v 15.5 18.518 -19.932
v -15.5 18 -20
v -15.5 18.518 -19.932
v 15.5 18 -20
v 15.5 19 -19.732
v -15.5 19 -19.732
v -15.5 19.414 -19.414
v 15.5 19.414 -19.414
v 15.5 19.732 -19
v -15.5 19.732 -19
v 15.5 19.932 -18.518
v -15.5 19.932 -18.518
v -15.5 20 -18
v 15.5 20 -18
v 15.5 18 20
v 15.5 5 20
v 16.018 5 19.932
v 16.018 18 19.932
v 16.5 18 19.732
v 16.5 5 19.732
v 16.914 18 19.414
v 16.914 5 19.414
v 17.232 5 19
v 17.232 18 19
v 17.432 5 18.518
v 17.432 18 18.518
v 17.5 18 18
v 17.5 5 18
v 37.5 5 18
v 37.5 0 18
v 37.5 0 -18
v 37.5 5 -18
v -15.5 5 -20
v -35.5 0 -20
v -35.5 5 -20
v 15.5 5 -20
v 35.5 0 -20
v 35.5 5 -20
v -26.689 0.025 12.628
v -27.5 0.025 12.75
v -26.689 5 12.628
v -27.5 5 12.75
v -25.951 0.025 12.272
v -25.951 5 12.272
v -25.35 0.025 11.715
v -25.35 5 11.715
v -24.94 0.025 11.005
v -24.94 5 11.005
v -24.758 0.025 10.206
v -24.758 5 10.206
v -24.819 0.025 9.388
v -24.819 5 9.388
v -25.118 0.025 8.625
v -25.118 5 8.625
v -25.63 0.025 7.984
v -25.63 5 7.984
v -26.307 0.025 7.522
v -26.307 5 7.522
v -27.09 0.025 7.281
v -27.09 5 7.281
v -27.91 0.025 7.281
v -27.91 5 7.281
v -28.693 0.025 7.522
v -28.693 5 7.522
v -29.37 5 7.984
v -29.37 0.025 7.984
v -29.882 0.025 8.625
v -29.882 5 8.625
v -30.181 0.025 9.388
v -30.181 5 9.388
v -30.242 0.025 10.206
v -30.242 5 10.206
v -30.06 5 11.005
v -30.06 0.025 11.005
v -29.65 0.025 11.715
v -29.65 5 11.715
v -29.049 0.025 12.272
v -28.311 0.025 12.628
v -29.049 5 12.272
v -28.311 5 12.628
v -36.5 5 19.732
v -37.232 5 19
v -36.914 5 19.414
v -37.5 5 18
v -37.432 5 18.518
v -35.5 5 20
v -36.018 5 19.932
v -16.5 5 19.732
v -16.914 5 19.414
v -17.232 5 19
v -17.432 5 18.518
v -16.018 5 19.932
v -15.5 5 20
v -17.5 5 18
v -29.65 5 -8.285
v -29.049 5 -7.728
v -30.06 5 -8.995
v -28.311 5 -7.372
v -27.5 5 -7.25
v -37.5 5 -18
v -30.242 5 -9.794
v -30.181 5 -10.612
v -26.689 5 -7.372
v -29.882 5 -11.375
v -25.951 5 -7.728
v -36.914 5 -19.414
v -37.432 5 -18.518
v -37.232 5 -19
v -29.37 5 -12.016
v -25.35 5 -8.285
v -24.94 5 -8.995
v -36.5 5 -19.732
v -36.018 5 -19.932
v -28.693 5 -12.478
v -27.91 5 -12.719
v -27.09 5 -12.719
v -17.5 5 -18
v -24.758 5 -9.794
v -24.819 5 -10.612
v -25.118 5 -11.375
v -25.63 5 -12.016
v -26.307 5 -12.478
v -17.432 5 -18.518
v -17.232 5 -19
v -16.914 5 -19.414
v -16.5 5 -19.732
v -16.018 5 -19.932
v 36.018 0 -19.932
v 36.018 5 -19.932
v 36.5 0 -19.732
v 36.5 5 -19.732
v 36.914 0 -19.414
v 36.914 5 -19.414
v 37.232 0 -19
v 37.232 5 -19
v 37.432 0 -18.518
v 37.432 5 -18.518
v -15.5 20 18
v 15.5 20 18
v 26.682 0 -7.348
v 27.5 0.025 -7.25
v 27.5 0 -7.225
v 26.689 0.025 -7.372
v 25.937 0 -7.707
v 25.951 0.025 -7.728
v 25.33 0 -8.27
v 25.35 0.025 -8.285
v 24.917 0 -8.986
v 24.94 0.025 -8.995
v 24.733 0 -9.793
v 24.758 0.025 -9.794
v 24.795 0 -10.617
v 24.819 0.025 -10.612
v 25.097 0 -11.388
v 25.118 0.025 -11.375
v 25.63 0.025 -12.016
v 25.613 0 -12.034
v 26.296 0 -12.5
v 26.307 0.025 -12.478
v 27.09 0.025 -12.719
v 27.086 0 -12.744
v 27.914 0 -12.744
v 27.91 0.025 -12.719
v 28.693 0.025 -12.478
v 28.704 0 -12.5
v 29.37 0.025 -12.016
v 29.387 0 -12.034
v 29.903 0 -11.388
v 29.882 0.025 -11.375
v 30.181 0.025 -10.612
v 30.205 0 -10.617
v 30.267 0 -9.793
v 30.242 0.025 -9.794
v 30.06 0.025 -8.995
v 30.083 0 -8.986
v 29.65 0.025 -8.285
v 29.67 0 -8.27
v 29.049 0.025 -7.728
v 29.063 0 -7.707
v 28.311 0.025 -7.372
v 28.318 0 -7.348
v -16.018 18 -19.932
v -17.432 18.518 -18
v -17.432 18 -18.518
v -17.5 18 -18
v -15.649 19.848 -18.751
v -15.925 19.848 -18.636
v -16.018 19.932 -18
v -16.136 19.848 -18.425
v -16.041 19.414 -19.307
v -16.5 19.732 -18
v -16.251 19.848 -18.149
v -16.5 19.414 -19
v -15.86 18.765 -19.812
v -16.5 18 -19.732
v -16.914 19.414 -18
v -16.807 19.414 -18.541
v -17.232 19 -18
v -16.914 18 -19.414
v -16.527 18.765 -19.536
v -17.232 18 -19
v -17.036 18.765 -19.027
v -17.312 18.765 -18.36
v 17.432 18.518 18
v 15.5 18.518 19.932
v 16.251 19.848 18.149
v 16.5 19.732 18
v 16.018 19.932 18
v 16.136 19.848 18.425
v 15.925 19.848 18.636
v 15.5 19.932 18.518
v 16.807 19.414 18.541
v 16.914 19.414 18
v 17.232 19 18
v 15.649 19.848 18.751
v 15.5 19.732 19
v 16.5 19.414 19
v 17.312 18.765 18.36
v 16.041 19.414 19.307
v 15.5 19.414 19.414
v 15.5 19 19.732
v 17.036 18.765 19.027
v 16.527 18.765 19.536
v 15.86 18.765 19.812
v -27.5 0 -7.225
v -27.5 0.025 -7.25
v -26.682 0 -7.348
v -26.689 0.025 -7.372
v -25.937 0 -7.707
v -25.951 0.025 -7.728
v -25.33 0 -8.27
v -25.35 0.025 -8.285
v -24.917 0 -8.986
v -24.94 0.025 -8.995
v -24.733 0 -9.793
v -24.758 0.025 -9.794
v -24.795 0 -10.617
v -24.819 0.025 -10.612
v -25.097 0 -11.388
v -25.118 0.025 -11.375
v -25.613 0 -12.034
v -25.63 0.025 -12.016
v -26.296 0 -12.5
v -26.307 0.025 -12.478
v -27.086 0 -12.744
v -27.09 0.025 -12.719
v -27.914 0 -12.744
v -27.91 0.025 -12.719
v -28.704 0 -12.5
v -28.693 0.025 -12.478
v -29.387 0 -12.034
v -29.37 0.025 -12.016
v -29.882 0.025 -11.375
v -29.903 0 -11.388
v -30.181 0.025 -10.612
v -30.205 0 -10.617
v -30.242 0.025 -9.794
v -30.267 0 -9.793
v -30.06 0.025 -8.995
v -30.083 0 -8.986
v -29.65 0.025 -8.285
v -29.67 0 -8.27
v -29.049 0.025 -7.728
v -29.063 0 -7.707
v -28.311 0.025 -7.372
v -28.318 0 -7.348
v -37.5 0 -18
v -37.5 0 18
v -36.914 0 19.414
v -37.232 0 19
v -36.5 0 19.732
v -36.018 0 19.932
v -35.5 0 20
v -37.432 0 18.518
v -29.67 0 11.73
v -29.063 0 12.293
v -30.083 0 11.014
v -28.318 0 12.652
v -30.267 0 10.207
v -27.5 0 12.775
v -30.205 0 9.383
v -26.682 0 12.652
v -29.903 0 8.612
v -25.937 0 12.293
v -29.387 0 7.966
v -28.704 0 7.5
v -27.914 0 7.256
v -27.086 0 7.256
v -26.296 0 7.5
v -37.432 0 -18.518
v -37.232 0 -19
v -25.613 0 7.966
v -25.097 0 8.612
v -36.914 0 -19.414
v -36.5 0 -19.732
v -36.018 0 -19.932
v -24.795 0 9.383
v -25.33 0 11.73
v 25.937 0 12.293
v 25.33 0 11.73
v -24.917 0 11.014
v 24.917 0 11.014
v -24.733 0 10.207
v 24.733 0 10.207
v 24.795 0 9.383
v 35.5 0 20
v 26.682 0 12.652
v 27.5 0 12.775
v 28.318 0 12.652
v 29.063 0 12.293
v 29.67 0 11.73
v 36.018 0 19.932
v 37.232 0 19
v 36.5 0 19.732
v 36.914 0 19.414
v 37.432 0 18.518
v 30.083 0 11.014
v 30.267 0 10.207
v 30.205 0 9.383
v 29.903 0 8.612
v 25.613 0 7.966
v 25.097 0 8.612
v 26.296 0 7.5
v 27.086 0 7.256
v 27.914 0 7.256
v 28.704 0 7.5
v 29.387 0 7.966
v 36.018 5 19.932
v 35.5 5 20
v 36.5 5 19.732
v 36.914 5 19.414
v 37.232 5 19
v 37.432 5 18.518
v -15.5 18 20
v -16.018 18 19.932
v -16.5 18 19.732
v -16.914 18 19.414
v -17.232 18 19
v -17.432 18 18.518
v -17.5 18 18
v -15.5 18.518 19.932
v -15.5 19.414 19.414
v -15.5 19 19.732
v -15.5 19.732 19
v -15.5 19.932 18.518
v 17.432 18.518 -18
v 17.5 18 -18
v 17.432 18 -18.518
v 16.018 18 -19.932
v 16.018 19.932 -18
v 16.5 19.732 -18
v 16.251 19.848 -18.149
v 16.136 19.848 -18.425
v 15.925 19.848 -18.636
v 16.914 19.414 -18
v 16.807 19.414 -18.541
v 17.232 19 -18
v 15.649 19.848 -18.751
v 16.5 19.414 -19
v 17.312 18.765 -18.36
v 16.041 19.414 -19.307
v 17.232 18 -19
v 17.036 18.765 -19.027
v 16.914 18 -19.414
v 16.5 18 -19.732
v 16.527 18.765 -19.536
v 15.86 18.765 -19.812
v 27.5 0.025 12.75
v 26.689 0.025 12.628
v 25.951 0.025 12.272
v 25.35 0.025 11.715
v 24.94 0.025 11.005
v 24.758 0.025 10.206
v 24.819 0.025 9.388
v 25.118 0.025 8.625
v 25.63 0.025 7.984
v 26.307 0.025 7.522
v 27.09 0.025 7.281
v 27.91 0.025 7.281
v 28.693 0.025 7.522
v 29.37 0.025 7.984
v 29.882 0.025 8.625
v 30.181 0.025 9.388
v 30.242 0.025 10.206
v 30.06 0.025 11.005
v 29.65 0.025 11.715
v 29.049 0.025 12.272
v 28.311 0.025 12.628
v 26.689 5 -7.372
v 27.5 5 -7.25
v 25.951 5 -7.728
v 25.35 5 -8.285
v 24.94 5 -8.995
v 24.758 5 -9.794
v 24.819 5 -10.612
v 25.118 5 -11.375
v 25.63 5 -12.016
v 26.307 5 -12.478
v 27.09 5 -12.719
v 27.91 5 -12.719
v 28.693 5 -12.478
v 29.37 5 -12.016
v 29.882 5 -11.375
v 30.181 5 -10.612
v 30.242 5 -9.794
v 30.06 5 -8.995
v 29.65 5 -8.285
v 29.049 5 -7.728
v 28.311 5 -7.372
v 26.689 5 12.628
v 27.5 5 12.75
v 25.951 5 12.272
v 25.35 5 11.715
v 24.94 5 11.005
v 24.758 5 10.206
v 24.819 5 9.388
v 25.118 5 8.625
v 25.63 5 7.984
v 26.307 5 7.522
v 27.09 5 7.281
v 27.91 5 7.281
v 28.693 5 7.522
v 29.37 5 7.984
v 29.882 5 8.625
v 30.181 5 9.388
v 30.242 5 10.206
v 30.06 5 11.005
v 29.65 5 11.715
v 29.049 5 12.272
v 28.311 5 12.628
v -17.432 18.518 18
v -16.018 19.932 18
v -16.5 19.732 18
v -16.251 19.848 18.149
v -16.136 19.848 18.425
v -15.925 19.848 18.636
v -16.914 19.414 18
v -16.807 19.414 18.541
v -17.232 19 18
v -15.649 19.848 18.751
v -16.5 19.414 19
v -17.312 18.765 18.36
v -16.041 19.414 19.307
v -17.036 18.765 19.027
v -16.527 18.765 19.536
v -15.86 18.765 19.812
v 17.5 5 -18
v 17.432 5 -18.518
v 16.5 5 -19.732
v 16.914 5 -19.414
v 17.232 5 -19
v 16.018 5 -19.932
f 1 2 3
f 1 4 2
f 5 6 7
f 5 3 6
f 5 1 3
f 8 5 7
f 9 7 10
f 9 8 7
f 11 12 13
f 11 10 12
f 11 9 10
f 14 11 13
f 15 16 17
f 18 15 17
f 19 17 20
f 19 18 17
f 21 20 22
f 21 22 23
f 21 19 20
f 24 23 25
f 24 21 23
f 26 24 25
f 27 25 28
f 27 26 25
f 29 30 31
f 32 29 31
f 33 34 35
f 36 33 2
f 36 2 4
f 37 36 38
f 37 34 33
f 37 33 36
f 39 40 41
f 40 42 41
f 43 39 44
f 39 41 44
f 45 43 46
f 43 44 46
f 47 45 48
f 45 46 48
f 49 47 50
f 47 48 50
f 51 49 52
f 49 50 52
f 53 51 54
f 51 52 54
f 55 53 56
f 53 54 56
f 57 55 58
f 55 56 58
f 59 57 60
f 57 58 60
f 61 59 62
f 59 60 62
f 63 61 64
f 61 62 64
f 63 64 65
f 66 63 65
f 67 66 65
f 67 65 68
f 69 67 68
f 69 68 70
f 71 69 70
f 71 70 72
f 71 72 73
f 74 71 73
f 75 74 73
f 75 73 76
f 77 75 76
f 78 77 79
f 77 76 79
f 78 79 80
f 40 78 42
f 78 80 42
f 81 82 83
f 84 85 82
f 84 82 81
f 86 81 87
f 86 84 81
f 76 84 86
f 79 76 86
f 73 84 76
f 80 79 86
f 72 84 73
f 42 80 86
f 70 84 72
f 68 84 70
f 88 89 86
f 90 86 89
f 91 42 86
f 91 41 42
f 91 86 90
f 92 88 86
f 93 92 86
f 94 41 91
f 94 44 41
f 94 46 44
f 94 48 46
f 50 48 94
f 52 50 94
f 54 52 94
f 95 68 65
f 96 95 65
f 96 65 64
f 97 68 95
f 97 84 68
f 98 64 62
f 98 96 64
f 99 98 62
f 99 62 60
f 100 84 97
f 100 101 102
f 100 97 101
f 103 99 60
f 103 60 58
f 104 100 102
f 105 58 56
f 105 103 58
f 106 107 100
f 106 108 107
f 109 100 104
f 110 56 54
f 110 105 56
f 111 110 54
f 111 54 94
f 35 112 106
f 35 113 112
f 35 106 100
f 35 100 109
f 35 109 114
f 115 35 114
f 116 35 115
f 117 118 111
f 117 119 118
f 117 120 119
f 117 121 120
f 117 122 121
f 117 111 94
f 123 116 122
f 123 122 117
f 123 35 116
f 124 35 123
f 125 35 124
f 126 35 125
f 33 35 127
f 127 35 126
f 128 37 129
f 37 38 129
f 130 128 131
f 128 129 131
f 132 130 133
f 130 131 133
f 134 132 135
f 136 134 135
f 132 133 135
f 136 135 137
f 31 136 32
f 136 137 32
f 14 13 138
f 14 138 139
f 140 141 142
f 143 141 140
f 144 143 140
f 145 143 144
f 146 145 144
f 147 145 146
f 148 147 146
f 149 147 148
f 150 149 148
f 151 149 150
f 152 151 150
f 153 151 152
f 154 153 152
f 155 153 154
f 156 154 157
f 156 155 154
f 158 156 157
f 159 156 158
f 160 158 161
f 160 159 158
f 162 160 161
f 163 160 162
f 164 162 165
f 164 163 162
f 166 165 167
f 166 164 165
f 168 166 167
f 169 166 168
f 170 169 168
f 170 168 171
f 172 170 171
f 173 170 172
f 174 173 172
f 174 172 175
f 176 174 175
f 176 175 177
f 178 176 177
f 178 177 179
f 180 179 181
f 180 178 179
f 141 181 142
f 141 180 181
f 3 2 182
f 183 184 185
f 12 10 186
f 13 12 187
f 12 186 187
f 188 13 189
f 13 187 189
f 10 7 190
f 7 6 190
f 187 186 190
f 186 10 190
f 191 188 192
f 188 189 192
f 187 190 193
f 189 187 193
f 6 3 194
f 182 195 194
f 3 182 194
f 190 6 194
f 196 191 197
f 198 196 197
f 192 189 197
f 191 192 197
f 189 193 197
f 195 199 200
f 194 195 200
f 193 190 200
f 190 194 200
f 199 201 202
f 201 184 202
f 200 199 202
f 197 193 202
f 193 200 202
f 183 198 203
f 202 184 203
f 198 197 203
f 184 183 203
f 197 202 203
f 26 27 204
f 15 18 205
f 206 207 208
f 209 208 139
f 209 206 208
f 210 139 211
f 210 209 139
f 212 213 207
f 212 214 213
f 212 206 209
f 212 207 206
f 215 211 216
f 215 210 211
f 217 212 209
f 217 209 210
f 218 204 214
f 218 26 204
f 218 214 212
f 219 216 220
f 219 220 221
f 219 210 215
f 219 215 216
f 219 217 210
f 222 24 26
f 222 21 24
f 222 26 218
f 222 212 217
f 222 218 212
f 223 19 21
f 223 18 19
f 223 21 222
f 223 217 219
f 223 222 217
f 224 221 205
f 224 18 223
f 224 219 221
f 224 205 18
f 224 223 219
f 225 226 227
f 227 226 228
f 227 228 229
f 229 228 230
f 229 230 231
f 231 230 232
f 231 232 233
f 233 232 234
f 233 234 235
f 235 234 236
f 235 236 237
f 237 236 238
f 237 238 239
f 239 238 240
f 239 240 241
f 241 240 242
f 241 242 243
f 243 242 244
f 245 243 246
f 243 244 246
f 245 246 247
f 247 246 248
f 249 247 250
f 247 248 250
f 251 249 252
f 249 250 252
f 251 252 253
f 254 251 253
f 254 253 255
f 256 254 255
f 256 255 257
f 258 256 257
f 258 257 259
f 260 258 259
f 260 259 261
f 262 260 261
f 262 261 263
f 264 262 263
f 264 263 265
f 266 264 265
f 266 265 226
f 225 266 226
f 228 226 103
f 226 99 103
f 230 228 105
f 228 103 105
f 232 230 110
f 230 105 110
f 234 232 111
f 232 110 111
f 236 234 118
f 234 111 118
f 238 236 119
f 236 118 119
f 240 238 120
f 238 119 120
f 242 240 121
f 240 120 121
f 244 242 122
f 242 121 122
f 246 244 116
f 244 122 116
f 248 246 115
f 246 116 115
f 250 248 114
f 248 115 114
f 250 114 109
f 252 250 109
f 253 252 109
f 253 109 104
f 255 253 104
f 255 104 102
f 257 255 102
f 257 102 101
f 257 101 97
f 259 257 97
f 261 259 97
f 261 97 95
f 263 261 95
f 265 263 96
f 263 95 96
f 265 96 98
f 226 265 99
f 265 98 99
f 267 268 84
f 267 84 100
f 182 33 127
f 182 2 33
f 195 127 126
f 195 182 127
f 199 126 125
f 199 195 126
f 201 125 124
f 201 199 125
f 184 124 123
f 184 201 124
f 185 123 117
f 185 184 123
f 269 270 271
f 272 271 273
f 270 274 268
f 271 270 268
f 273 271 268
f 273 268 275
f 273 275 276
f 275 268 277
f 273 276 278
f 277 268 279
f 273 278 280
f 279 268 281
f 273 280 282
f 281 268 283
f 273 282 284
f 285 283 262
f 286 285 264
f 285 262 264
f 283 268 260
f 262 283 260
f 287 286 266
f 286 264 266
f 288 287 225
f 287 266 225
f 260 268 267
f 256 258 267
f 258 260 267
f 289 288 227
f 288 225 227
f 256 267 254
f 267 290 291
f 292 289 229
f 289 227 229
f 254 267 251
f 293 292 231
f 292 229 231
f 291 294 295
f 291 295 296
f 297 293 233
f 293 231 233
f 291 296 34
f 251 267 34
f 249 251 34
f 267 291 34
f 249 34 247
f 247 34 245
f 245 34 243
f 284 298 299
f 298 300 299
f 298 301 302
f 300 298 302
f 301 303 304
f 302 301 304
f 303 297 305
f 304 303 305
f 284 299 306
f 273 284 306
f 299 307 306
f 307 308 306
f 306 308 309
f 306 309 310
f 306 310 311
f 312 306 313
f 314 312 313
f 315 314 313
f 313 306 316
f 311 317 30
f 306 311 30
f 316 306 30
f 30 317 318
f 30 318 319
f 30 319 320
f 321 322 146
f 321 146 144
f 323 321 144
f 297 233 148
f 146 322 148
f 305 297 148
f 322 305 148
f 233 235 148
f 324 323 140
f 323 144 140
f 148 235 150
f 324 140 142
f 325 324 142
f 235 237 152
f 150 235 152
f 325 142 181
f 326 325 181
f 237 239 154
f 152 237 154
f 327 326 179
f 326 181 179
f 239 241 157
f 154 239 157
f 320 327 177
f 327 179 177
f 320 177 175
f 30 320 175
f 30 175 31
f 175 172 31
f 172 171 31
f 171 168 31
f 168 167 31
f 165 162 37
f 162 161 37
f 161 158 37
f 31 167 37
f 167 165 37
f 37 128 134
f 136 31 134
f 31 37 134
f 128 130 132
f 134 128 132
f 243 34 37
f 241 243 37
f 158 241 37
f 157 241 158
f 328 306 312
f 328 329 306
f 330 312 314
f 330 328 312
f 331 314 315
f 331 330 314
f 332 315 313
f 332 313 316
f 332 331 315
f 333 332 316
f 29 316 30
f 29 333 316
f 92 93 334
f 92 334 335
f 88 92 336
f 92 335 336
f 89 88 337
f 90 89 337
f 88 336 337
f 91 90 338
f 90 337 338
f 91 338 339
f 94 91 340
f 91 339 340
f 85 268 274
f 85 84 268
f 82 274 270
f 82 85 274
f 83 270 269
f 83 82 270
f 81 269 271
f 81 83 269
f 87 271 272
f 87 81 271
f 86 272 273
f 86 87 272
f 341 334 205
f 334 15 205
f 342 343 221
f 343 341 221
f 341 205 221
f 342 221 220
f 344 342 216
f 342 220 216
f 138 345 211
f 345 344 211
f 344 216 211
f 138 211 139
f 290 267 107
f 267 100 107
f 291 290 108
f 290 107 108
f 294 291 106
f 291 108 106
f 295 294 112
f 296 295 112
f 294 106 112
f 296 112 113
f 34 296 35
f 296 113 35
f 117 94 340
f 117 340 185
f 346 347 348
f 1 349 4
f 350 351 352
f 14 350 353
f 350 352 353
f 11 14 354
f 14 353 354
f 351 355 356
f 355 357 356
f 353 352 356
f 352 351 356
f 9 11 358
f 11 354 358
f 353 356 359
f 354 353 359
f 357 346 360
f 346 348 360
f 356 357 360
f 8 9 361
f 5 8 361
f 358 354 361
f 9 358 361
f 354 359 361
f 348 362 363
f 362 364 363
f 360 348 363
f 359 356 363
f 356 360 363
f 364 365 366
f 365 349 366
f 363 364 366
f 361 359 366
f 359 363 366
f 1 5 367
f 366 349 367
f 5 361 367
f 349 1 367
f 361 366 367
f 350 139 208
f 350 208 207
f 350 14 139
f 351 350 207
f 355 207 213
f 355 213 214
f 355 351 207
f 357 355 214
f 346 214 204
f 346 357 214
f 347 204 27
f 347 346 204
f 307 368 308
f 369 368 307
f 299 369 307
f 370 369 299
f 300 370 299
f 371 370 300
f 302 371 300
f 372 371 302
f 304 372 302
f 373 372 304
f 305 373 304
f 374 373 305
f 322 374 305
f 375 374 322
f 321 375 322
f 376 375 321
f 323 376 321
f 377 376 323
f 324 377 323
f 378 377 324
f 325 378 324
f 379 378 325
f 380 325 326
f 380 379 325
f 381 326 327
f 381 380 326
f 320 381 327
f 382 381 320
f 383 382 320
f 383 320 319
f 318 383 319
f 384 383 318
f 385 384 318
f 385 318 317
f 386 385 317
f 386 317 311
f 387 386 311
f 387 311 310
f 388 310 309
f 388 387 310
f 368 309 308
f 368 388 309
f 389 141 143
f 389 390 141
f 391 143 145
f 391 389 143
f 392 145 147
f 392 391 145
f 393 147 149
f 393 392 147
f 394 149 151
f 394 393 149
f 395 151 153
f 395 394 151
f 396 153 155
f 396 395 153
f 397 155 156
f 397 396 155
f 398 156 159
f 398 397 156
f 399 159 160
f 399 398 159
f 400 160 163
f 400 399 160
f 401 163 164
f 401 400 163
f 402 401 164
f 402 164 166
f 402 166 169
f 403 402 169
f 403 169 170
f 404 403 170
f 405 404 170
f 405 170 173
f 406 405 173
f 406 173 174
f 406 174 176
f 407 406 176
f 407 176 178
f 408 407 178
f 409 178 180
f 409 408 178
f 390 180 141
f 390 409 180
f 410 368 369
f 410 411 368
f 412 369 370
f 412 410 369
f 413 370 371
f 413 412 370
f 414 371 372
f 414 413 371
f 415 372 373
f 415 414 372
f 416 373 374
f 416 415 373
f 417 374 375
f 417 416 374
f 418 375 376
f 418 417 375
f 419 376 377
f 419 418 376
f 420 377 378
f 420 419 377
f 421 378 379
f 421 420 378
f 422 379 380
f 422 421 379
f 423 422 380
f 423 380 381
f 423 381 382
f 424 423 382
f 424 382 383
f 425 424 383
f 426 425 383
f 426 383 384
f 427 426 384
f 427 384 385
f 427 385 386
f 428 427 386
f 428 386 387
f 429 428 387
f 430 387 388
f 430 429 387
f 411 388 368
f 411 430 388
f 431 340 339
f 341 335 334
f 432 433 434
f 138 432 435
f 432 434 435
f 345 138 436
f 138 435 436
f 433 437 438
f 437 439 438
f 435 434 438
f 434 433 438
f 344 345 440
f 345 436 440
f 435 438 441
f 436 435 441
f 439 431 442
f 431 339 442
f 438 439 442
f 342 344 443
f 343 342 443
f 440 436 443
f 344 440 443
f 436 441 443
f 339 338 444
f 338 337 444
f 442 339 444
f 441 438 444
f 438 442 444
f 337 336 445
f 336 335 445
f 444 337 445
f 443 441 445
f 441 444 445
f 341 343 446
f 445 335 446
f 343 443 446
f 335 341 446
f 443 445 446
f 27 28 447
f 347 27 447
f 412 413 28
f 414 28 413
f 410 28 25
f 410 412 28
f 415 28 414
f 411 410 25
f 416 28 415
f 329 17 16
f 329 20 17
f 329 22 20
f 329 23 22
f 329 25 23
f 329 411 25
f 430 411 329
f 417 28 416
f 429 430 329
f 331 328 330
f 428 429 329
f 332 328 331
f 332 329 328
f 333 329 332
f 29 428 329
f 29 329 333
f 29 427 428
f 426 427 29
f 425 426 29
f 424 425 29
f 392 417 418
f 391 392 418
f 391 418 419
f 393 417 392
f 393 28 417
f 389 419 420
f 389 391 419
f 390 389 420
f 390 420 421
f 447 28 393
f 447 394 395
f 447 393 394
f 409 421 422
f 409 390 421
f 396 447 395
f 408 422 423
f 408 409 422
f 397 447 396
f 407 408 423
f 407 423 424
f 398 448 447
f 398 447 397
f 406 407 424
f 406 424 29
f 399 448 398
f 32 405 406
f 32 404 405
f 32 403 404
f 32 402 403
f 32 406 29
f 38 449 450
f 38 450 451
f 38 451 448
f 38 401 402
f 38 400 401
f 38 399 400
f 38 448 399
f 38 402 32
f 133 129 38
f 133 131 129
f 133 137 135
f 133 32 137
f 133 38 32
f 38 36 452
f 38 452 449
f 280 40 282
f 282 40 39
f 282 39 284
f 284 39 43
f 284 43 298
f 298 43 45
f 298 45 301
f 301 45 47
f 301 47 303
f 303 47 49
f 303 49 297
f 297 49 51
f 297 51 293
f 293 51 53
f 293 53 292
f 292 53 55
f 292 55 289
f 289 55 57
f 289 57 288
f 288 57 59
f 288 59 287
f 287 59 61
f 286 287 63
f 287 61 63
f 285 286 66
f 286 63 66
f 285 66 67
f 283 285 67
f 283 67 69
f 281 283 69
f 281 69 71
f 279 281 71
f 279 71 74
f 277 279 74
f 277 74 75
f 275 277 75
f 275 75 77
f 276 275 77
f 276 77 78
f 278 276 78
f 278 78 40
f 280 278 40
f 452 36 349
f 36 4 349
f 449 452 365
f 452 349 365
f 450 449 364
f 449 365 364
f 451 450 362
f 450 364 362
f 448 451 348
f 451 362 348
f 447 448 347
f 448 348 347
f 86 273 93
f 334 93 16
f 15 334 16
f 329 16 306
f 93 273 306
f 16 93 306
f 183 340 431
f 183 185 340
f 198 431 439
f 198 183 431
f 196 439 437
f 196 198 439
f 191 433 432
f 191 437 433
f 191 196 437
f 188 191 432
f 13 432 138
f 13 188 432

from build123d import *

# Parameters (mm, degrees)
SKETCH1_W                      = 75
SKETCH1_H                      = 40
BOSS_EXTRUDE1_DEPTH            = 5
SKETCH3_W                      = 35
SKETCH3_H                      = 40
BOSS_EXTRUDE2_DEPTH            = 15
FILLET1_R                      = 2
FILLET2_R                      = 2
M5_CLEARANCE_HOLE1_D           = 5.5
M5_CLEARANCE_HOLE1_CSINK_D     = 5.55
M5_CLEARANCE_HOLE1_CSINK_ANGLE = 90


with BuildPart() as part:
    # Sketch1 → Boss-Extrude1 (new body)
    with BuildSketch(Plane(origin=(0, 0, 0), x_dir=(1, 0, 0), z_dir=(0, 1, 0))):
        Rectangle(SKETCH1_W, SKETCH1_H)
    extrude(amount=BOSS_EXTRUDE1_DEPTH)

    # Sketch3 → Boss-Extrude2 (add)
    with BuildSketch(Plane(origin=(0, 5, 0), x_dir=(1, 0, 0), z_dir=(0, 1, 0))):
        Rectangle(SKETCH3_W, SKETCH3_H)
    extrude(amount=BOSS_EXTRUDE2_DEPTH)

    # Fillet1
    fillet1_edges = [part.edges().sort_by_distance(p)[0] for p in [
        (-37.5, 2.5, -20),
        (-37.5, 2.5, 20),
        (37.5, 2.5, 20),
        (37.5, 2.5, -20),
    ]]
    fillet(fillet1_edges, radius=FILLET1_R)

    # Fillet2
    fillet2_edges = [part.edges().sort_by_distance(p)[0] for p in [
        (17.5, 12.5, 20),
        (17.5, 12.5, -20),
        (-17.5, 12.5, -20),
        (-17.5, 12.5, 20),
        (17.5, 20, 0),
        (0, 20, -20),
        (-17.5, 20, 0),
        (0, 20, 20),
    ]]
    fillet(fillet2_edges, radius=FILLET2_R)

    # M5 Clearance Hole1 (through all)
    with Locations(Plane(origin=(-27.5, 0, 10), x_dir=(0, 0, -1), z_dir=(0, -1, 0))):
        with Locations((0, 0), (20, 0)):
            m5_clearance_hole1 = CounterSinkHole(M5_CLEARANCE_HOLE1_D / 2, M5_CLEARANCE_HOLE1_CSINK_D / 2, counter_sink_angle=M5_CLEARANCE_HOLE1_CSINK_ANGLE)

    # Mirror1: M5 Clearance Hole1 across plane
    add(m5_clearance_hole1.mirror(Plane(origin=(0, 0, 0), x_dir=(0, 0, 1), z_dir=(1, 0, 0))), mode=Mode.SUBTRACT)


solid = part.part
